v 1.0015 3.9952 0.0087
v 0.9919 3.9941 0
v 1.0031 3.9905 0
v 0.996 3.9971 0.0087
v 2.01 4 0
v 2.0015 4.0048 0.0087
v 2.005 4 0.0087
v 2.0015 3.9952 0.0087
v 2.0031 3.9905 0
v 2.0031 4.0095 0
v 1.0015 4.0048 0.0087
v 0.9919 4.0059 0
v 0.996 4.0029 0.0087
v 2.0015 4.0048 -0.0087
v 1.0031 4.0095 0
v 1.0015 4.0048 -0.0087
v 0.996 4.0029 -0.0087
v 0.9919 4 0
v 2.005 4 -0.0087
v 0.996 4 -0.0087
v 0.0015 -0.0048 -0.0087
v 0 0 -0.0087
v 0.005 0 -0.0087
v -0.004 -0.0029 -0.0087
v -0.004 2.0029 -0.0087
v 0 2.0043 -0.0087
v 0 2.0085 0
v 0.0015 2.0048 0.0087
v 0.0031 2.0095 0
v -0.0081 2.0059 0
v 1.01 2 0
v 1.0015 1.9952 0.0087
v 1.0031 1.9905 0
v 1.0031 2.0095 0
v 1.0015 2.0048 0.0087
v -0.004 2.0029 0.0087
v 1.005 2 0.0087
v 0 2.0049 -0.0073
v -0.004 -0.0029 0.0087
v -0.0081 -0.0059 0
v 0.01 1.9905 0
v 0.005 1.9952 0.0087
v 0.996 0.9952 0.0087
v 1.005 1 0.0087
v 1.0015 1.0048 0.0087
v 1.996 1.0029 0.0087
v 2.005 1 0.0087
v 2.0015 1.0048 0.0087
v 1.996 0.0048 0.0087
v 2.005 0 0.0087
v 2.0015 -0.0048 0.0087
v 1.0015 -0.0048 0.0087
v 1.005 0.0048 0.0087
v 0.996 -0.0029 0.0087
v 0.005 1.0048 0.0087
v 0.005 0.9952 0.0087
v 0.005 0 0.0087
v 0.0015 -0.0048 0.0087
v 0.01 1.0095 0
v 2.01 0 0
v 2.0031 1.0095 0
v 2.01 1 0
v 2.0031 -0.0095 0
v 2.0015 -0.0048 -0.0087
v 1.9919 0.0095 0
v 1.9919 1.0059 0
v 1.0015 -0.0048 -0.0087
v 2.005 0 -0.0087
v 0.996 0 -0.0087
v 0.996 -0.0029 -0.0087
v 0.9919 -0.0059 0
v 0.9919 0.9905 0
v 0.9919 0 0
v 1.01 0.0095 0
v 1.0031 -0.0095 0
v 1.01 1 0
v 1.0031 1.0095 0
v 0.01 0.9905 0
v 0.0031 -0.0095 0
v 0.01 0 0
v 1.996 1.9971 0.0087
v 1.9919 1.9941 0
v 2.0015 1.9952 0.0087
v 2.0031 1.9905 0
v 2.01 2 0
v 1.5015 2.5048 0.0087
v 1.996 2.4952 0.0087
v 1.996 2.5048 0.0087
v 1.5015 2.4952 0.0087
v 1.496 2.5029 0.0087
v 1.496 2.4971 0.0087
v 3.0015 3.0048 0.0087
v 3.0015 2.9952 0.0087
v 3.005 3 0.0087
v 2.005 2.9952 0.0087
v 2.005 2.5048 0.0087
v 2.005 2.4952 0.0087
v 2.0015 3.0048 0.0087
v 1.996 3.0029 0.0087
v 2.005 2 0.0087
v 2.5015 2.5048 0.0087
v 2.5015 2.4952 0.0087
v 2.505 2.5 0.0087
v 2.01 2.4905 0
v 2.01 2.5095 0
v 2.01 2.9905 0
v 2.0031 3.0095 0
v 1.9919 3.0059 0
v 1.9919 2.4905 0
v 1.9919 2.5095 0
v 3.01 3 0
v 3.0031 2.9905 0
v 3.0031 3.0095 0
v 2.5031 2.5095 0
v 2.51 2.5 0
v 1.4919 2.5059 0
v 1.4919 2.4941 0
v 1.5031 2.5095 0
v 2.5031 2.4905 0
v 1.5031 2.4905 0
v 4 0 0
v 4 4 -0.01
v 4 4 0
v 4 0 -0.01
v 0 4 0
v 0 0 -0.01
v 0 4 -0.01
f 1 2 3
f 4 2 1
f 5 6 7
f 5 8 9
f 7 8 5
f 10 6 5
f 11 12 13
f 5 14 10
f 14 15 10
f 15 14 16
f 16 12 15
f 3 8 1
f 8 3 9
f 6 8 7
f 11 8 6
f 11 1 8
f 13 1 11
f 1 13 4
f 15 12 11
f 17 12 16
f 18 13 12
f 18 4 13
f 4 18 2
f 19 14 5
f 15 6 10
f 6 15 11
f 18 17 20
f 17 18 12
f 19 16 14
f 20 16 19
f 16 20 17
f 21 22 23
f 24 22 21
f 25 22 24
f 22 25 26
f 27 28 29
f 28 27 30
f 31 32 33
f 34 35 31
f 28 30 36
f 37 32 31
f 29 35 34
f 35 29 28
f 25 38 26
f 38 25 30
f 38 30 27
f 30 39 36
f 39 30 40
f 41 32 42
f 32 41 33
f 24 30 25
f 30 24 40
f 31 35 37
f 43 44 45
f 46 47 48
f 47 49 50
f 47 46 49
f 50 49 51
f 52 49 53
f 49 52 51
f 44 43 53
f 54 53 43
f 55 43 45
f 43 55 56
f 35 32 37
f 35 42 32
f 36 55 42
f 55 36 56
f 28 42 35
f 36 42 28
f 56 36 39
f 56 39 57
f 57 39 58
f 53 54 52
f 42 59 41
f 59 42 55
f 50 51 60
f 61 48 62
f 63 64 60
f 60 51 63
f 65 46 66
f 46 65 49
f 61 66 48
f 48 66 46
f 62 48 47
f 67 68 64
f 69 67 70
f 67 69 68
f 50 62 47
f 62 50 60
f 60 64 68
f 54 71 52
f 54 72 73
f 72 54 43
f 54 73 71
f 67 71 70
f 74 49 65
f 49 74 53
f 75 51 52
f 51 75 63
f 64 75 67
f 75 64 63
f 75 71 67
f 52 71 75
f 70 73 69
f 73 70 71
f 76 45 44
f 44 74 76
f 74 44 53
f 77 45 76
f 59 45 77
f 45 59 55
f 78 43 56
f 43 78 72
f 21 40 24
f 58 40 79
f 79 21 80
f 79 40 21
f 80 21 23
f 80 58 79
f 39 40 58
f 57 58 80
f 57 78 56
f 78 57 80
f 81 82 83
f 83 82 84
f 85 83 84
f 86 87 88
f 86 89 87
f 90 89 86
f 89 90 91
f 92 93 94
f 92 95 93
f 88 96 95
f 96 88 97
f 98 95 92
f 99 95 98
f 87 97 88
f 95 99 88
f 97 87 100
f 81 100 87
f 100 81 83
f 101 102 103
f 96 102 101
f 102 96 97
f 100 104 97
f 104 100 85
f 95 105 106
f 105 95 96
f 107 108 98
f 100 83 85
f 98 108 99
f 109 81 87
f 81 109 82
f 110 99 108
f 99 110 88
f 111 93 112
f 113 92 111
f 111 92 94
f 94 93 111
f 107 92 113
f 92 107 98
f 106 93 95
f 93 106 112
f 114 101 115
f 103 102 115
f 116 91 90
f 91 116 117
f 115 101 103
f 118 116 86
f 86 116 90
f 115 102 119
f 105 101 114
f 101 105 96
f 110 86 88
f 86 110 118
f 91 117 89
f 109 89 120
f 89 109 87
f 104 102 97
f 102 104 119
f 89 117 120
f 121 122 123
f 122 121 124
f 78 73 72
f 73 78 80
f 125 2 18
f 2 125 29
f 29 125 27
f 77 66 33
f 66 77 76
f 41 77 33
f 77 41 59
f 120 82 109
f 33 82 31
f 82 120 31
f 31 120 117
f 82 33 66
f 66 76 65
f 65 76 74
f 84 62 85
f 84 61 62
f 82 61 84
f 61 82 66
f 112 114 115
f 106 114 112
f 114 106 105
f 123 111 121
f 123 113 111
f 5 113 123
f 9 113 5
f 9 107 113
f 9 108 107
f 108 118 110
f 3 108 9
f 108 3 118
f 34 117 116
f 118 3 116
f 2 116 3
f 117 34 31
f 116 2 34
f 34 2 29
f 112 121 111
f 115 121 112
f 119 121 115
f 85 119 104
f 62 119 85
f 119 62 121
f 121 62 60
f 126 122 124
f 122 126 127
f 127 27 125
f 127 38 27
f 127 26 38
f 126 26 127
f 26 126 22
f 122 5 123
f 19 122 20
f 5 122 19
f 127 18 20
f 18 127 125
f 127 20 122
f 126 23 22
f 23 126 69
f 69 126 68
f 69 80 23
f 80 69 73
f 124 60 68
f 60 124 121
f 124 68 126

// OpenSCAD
hull(){
    translate([2.0, 4.0]) sphere(0.01);
    translate([1.0, 4.0]) sphere(0.01);
}
hull(){
    translate([1.0, 2.0]) sphere(0.01);
    translate([0.0, 2.0]) sphere(0.01);
}
hull(){
    translate([0.0, 2.0]) sphere(0.01);
    translate([0.0, 1.0]) sphere(0.01);
}
hull(){
    translate([2.0, 1.0]) sphere(0.01);
    translate([2.0, 0.0]) sphere(0.01);
}
hull(){
    translate([2.0, 0.0]) sphere(0.01);
    translate([1.0, 0.0]) sphere(0.01);
}
hull(){
    translate([1.0, 0.0]) sphere(0.01);
    translate([1.0, 1.0]) sphere(0.01);
}
hull(){
    translate([1.0, 1.0]) sphere(0.01);
    translate([0.0, 1.0]) sphere(0.01);
}
hull(){
    translate([0.0, 1.0]) sphere(0.01);
    translate([0.0, 0.0]) sphere(0.01);
}
hull(){
    translate([2.0, 2.0]) sphere(0.01);
    translate([2.0, 3.0]) sphere(0.01);
}
hull(){
    translate([2.0, 3.0]) sphere(0.01);
    translate([3.0, 3.0]) sphere(0.01);
}
hull(){
    translate([1.5, 2.5]) sphere(0.01);
    translate([2.5, 2.5]) sphere(0.01);
}
translate([0,0,-0.01]) color([0.1,0.1,0.1]) cube([4,4,0.01]);
